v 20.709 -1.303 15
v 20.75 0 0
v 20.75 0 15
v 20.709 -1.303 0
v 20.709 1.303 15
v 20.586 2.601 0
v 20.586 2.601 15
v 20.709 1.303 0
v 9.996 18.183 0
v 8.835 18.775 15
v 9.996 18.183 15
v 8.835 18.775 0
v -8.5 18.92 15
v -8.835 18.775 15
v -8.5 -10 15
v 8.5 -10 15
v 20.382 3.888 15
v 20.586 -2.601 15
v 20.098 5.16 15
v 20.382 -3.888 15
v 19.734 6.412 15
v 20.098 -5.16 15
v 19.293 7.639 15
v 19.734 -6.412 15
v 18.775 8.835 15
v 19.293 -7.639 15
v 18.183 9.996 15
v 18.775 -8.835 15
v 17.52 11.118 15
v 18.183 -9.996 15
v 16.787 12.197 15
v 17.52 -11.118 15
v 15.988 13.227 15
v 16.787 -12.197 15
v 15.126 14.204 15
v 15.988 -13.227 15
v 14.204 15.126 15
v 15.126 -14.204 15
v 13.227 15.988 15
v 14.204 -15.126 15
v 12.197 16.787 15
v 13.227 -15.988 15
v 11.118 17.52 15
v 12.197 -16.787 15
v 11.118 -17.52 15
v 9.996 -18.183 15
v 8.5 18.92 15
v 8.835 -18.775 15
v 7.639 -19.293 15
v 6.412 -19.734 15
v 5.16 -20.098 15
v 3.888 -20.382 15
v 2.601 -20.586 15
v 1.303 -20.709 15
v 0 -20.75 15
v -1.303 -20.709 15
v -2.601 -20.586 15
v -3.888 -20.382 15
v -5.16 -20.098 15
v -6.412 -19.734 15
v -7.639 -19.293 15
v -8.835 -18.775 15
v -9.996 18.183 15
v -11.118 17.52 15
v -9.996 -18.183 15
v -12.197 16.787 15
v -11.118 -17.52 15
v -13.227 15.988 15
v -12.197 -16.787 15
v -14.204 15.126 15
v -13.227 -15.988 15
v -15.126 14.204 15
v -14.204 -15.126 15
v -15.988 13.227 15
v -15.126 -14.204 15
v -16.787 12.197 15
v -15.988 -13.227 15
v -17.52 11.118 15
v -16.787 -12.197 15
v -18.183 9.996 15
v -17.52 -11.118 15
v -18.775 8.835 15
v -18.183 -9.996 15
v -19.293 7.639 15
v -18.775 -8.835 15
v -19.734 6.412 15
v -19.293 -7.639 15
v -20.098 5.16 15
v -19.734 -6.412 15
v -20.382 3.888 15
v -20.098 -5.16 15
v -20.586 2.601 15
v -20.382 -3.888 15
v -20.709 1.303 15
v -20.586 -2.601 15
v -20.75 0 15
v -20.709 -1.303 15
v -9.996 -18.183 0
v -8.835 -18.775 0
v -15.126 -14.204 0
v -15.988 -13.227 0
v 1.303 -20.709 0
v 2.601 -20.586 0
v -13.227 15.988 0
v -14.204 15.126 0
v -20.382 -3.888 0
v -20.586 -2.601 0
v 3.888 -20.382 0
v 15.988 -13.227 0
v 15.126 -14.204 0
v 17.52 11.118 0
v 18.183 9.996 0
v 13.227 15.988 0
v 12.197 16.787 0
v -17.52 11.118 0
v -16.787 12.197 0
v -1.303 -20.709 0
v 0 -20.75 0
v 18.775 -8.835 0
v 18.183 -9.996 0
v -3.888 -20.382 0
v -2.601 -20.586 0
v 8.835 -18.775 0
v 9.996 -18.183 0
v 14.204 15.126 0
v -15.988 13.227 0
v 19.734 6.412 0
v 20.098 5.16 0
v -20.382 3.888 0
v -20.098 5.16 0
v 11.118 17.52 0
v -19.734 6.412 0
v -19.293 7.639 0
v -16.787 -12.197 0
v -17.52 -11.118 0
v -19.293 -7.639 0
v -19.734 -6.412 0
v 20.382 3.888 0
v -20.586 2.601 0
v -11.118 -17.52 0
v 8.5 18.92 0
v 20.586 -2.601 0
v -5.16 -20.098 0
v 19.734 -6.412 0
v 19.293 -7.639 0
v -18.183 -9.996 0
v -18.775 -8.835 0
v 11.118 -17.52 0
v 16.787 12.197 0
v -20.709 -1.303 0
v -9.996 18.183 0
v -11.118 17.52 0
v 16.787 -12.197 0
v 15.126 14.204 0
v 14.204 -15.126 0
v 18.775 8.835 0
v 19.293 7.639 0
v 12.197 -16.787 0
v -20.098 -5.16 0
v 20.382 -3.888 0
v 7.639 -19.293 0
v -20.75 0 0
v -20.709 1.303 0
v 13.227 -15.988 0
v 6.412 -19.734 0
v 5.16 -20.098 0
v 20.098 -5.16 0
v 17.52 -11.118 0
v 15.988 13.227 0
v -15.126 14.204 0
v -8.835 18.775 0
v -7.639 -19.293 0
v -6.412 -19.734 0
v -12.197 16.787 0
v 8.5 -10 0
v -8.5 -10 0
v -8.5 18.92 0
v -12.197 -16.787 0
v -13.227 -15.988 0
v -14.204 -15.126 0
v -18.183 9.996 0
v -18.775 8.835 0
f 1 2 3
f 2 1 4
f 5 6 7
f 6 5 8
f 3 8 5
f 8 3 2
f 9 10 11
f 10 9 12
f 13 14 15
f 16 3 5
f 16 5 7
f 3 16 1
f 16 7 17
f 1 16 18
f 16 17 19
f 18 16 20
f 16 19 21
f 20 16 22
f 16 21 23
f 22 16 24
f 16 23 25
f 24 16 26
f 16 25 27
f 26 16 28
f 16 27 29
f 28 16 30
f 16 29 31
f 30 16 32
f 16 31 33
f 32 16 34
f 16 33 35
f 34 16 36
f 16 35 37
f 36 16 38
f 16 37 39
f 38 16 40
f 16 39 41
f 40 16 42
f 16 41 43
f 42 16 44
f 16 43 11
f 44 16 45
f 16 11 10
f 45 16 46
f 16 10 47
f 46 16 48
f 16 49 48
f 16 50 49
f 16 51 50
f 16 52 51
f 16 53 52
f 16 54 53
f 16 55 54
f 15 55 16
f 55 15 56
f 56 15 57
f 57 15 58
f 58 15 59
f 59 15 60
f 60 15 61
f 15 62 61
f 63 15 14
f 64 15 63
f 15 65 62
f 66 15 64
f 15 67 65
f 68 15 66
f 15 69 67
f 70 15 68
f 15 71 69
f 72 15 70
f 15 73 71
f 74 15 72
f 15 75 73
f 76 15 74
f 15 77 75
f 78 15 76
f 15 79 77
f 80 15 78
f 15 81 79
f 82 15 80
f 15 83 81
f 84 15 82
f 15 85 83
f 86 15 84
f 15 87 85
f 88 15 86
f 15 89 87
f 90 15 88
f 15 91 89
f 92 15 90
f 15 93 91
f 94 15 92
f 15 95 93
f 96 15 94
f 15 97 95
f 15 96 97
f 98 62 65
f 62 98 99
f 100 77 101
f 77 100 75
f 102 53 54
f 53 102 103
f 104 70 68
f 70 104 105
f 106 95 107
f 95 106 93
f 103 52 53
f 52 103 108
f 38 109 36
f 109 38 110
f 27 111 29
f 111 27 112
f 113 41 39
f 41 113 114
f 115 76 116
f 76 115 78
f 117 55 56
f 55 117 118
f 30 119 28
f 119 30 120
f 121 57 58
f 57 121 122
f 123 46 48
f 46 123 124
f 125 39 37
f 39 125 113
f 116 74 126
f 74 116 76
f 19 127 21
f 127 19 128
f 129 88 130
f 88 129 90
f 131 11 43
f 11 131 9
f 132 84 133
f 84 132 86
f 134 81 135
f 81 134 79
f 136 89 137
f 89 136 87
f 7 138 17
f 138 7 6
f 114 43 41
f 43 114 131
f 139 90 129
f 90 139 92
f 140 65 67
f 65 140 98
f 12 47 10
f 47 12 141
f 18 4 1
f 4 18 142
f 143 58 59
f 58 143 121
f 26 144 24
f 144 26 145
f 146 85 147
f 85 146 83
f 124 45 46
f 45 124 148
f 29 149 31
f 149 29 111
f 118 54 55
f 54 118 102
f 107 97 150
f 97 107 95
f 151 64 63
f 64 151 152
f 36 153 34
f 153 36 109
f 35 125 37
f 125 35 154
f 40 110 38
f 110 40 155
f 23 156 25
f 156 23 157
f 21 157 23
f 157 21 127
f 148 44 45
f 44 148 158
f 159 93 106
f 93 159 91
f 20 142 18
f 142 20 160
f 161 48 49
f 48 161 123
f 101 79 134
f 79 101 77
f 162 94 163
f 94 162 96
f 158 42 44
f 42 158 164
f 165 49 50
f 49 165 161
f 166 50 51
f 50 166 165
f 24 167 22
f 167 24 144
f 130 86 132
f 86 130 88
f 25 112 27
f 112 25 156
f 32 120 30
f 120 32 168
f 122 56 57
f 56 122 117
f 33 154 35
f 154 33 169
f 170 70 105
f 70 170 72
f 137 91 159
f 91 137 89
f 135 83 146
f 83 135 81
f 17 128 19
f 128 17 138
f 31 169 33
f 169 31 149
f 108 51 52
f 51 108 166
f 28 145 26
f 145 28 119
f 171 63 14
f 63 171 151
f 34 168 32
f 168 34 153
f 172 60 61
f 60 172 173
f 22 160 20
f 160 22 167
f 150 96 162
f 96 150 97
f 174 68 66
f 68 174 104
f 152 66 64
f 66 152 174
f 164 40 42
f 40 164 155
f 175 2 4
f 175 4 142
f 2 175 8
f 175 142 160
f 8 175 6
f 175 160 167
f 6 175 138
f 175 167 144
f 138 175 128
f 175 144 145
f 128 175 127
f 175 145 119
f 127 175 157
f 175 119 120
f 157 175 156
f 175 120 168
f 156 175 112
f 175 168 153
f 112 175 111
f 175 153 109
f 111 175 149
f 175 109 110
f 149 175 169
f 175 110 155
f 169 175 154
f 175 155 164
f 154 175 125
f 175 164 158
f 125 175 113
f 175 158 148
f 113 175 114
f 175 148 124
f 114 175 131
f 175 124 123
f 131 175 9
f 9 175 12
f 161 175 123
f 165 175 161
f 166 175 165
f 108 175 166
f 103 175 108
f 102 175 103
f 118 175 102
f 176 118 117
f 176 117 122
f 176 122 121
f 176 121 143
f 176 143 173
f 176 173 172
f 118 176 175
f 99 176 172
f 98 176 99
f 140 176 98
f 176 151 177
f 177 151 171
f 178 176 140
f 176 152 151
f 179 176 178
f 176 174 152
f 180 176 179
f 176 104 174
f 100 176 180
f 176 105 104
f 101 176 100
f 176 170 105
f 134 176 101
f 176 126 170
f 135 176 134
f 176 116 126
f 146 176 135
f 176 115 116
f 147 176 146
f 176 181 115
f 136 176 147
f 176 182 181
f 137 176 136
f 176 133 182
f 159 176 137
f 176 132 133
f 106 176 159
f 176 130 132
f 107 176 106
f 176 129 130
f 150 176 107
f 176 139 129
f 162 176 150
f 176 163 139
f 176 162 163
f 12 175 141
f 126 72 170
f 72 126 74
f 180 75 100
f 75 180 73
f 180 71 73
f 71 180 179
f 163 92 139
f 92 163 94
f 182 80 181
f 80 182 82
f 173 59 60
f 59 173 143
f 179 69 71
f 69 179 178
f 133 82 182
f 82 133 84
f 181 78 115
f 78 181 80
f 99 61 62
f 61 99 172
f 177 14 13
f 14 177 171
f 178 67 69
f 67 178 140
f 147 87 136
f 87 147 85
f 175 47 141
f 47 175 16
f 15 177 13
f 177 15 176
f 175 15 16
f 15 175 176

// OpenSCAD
LEDS = 3;

LED_ANGLE = 120;
LED_DIA = 20;
LED_MOUNT_HOLE_SPACING = 18;
LED_MOUNT_HOLE_DIA = 3;
LED_MOUNT_THICKNESS = 2;
LED_MOUNT_DIA = LED_DIA + LED_MOUNT_HOLE_DIA + 2;

S = sin(180 - LED_ANGLE);
C = cos(180 - LED_ANGLE);

CHANNEL_INNER_DIA = 20;
CHANNEL_OUTER_DIA = 25;
CHANNEL_HEIGHT = sin(180 - LED_ANGLE) * LED_MOUNT_DIA;

MOUNT_DIA = 41.5;
MOUNT_HEIGHT = 15;
MOUNT_CUTOUT_WIDTH = 17;
MOUNT_CUTOUT_OFFSET = -10;

$fn = 100;

module body() {
    intersection() {
        hull() {
            cylinder(d = CHANNEL_INNER_DIA, h = CHANNEL_HEIGHT);

            for(i = [0:LEDS-1]) {
                rotate([0, 0, i * 360/LEDS])
                translate([0, -CHANNEL_OUTER_DIA/2 - C * CHANNEL_HEIGHT/2 + LED_MOUNT_THICKNESS, LED_MOUNT_DIA/2 - LED_MOUNT_THICKNESS * S])
                rotate([(180 - LED_ANGLE), 0, 0])
                cylinder(d = LED_MOUNT_DIA, h = LED_MOUNT_THICKNESS, center = true);
            }
        }

        cylinder(d = CHANNEL_OUTER_DIA + 2 * C * CHANNEL_HEIGHT, h = CHANNEL_HEIGHT);
    }
}

module mount_holes() {
    for(i = [0:LEDS-1]) {
        rotate([0, 0, i * 360/LEDS])
        translate([0, -CHANNEL_OUTER_DIA/2 - C * CHANNEL_HEIGHT/2 + LED_MOUNT_THICKNESS, LED_MOUNT_DIA/2 - LED_MOUNT_THICKNESS * S])
        rotate([(180 - LED_ANGLE), 0, 0])
        rotate([0, 0, 45])
        for(j = [-1, 1]) {
            translate([-LED_MOUNT_HOLE_SPACING/2, 0, 0])
            cylinder(d = LED_MOUNT_HOLE_DIA, h = 3 * LED_MOUNT_THICKNESS, center = true);
            translate([LED_MOUNT_HOLE_SPACING/2, 0, 0])
            cylinder(d = LED_MOUNT_HOLE_DIA, h = 3 * LED_MOUNT_THICKNESS, center = true);
        }
    }
}

module channel() {
    cylinder(d = CHANNEL_INNER_DIA, h = CHANNEL_HEIGHT);
}

module mount() {
    difference() {
        cylinder(d = MOUNT_DIA, h = MOUNT_HEIGHT);
        #translate([-MOUNT_CUTOUT_WIDTH/2, MOUNT_CUTOUT_OFFSET, 0])
        cube(size = [MOUNT_CUTOUT_WIDTH, MOUNT_DIA, MOUNT_HEIGHT]);
    }
}

difference() {
    body();
    #mount_holes();
    #channel();
}

!mount();
